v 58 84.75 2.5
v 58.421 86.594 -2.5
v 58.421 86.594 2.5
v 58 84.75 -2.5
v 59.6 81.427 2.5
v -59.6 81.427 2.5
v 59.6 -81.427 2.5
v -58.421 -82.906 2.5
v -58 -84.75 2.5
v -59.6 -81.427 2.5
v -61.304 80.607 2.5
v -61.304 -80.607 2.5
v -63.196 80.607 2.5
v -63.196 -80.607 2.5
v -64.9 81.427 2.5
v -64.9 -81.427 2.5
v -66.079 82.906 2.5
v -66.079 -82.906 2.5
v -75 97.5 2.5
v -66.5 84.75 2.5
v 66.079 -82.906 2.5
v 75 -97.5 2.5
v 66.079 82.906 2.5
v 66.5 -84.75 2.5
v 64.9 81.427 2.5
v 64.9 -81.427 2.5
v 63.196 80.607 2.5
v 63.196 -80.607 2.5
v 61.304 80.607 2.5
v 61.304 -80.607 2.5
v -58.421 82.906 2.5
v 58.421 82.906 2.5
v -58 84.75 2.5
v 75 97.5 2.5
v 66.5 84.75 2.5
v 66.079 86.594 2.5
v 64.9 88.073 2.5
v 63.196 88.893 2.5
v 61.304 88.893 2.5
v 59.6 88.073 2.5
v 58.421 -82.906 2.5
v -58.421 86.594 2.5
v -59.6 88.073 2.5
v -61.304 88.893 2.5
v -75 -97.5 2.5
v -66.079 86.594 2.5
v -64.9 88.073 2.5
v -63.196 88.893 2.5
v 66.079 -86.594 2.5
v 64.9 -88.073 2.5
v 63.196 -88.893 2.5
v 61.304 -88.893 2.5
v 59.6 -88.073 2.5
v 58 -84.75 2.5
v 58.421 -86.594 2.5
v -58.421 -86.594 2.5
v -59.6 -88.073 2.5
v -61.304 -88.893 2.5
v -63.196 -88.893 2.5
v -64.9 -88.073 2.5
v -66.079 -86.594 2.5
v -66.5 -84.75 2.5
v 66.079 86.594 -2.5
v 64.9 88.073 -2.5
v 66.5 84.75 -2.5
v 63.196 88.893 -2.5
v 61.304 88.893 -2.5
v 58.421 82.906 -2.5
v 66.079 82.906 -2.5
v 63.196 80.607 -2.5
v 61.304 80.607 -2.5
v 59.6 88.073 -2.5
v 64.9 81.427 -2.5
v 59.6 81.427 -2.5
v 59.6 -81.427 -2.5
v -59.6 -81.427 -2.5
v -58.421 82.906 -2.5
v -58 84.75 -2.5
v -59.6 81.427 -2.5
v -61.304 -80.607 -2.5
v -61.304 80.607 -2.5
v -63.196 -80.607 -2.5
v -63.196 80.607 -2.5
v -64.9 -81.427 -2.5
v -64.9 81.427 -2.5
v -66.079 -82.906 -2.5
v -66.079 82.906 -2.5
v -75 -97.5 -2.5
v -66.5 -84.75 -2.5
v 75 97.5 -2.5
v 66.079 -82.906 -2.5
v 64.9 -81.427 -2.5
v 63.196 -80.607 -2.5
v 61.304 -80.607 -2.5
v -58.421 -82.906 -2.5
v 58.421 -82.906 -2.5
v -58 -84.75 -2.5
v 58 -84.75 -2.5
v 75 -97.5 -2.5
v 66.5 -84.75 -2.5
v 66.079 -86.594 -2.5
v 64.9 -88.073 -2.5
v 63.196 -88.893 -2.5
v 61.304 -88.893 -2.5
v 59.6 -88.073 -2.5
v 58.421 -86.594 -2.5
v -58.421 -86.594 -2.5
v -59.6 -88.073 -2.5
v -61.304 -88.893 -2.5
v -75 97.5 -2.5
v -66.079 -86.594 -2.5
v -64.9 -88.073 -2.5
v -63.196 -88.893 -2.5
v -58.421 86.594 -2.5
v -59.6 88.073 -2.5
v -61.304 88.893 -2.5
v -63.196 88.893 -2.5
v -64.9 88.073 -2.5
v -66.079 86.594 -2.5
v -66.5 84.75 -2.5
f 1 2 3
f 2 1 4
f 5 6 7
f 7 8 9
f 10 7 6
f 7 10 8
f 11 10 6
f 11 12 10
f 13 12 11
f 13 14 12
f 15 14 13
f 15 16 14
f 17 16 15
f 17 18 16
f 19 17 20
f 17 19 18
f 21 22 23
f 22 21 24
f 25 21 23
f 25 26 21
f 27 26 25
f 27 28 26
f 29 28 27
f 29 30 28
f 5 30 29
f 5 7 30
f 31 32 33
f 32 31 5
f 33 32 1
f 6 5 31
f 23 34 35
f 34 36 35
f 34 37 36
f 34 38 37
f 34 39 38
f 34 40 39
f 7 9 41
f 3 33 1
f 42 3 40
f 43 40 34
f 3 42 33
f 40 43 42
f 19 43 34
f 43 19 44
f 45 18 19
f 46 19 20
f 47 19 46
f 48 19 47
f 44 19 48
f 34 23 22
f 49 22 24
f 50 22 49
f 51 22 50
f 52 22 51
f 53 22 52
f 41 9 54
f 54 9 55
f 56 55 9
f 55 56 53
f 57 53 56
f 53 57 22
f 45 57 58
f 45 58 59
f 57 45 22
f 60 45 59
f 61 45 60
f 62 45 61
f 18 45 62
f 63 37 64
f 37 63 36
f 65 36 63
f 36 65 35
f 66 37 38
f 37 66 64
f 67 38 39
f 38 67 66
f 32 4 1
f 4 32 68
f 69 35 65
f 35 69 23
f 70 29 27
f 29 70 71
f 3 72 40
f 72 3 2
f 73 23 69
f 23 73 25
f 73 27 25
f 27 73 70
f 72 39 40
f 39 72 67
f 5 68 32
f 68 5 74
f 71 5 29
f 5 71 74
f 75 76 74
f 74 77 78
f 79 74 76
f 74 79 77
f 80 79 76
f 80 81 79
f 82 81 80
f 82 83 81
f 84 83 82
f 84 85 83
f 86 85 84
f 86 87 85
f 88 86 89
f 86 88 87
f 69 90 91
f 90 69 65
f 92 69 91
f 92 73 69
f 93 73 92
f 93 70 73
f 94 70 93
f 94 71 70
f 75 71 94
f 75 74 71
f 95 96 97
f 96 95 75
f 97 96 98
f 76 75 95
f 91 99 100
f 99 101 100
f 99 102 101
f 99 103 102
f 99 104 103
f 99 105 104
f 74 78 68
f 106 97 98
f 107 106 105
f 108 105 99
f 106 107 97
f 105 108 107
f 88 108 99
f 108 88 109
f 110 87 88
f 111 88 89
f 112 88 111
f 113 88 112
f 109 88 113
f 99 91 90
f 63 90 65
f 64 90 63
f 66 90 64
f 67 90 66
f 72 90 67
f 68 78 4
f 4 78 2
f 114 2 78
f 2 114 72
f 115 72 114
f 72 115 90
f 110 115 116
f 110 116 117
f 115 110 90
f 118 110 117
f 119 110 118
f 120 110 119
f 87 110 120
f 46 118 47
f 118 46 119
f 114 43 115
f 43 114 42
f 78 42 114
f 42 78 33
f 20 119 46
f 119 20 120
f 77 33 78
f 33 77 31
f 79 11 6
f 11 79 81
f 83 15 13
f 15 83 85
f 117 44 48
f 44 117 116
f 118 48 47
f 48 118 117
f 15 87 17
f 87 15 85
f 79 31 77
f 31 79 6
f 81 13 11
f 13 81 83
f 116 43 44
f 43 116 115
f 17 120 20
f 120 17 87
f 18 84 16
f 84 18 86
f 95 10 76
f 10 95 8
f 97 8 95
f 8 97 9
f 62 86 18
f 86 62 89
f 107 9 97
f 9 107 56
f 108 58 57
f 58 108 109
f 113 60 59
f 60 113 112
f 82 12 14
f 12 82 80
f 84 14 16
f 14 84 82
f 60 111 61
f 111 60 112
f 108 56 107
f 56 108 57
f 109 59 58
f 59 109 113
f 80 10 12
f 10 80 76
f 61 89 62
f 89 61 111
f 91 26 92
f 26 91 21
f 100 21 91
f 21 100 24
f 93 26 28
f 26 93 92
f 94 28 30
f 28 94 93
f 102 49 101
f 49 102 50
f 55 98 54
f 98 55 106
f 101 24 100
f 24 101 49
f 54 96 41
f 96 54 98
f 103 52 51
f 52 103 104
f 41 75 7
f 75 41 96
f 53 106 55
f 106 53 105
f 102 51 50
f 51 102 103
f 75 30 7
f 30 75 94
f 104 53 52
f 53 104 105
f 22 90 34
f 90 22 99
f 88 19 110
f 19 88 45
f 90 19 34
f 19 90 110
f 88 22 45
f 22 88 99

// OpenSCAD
// Generated by SolidPython 1.1.3 on 2023-12-09 18:50:50


difference() {
	cube(center = true, size = [150, 195.0000000000, 5]);
	union() {
		translate(v = [62.2500000000, 84.7500000000]) {
			cylinder(center = true, h = 5, r = 4.2500000000);
		}
		translate(v = [-62.2500000000, 84.7500000000]) {
			cylinder(center = true, h = 5, r = 4.2500000000);
		}
		translate(v = [-62.2500000000, -84.7500000000]) {
			cylinder(center = true, h = 5, r = 4.2500000000);
		}
		translate(v = [62.2500000000, -84.7500000000]) {
			cylinder(center = true, h = 5, r = 4.2500000000);
		}
	}
}
/***********************************************
*********      SolidPython code:      **********
************************************************
 
import solid
import numbers
import pudb
from solid.utils import *
import viewscad
import subprocess
import os
import os.path as osp
import math
import sys

chamfer_extrude=solid.import_scad("./chamfer_extrude.scad")
chamfer_extrude=chamfer_extrude.chamfer_extrude
r = viewscad.Renderer(width=800, height=800)

def debug(model,f_name,path="/home/ts/code/projects/mfd/designs/debug"):
    solid.scad_render_to_file(model,osp.join(path,f_name)+".scad")
#generate position list of wells using offset from center
wells_pos_from_center_4 = lambda offset: [[-offset,offset],
                                        [offset, offset],
                                        [-offset, -offset],
                                        [offset, -offset]]
#wells_pos_from_center_2 = lambda offset: [[0,offset],
#                                        [0, -offset]]
wells_pos_from_center_2 = lambda offset: [[offset,0],
                                        [-offset,0]]

def make_well(dims,shape=None,height=None,dxf=False):
    def circle_cylinder():
        if dxf or (height is None):
            well = solid.circle(r=dims, segments=64)
        else:
            well = solid.cylinder(r=dims, h=height, segments=64, center = True)
        return well
    if dims is None:
        sys.exit("radius needs to be a number")
    if isinstance(dims, numbers.Number):
        well =circle_cylinder()
    elif len(dims)==1:
        if isinstance(dims[1], numbers.Number):
            well =circle_cylinder()
        else:
            sys.exit("radius needs to be a number")
    elif len(dims)==2:
        well = solid.square(dims,center = True)
    elif len(dims)==3:
        well = solid.cube(dims, center = True)
    return well

def wells_top_bottom(center_gap,device_dims=None,shape=None,height=None, positions = None, dxf = False,well_shape=None):
    if well_shape == None:
        well_shape = make_well(device_dims,shape=shape,height=height,dxf=dxf)
    wells = []
    if positions is None:
        offset = radius+radius/2.0
        positions = wells_pos_from_center_2(offset)
    if dxf or (height is None):
        height = 0
    for position in positions:
        if dxf:
            wells.append(solid.translate([position[0],position[1]])(well_shape))
        else:
            wells.append(solid.translate([position[0],position[1],height/2.0])(well_shape))
    return  union()(*wells)

#place wells in four corners 
def four_corner(radius,height=None, positions = None, dxf = False):
    #if well pos not specified set
    #to equally spaced by half radius
    if positions is None:
        offset = radius+radius/2.0
        positions = wells_pos_from_center_4(offset)
    if dxf or (height is None):
        height = 0
    #make wells at positions with specified radius and height
    wells = []
    for position in positions:
        #make circle if making dxf
        if dxf:
            well_shape = solid.circle(r=radius, segments=64)
            well_shape = solid.translate([position[0],position[1]])(well_shape)
        #if stl make cylinder
        else:
            well_shape = solid.cylinder(r=radius, h=height, segments=64, center = True)
            well_shape = solid.translate([position[0],position[1],height/2.0])(well_shape)
        wells.append(well_shape)
    return  union()(*wells)

#generate channels 
def make_channels(length,width,height=0,num_chans=1,max_chans=None,spacing=None, dxf = False,
                  rotate_channels=False):
    if dxf or (height is None):
        height = 0
    #if channel gap not defined, is equal to
    if spacing is None: spacing = width
    #calculate number of channels if fitting max num within given width
    if not max_chans is None:
        import math
        num_chans = math.floor((max_chans-spacing)/(width+spacing))
    #get total width of channel section  
    total_width = (width*num_chans)+(spacing*(num_chans-1))

    #make template channel
    #if rotate_channels: width, length = length, width
    if dxf:
        channel_t = solid.square([length,width],center = True)
    else:
        channel_t = solid.cube([length,width,height], center = True)

    #if number channels is even, offset the first channel to center its gap
    if num_chans % 2 == 0: centering = -(width/2.0+spacing/2.0)
    else: centering = 0
    #move template channel up to align bottom at z = 0 
    #and offset center if necessary
    if dxf:
        channel_t = solid.translate([0,centering])(channel_t)
    else:
        channel_t = solid.translate([0,centering,height/2.0])(channel_t)

    #if rotate_channels: length,width = width,length
    #start making the channels
    channels = []
    for i in range(num_chans):
        #if i=0 there is no translation
        #if i=1, we make the first channel adjacent to second
        direction = i

        #if i>=1, we add channels alternating left and right
        if i >= 1:
            direction = -(i/2.0)
            if i % 2 == 1: direction = (-direction)+0.5
                
        #make channel at right position and add it to channel list
        translation_coords = [0,direction*(width+spacing)]
        #if rotate_channels: translation_coords = [direction*(width+spacing),0]
        if dxf:
            channel = solid.translate(translation_coords)(channel_t)
        else:
            channel = solid.translate([*translation_coords,0])(channel_t)
        channels.append(channel)
    
    #group all channels as one object
    channels = union()(*channels)
    #compute the x,y,z dimensions in order to pass as arguments 
    #for construction of other parts of device (such as the chambers)
    measurements = {'x':(length/2.0,-length/2.0),
                    'y':(total_width/2.0,-total_width/2.0)}
    if not dxf:
        measurements['z'] = (height,0)
    if rotate_channels:
        channels = solid.rotate(90)(channels)
        measurements['x'],measurements['y']=measurements['y'],measurements['x']
    return channels,measurements

def make_chambers(msrs,height=None,extra=0,len_until=None,width=None, dxf = False):
    #computes x,y,z length
    total = lambda x : abs(x[0]) + abs(x[1])
    
    #if specific height if specified
    #otherwise use same height as channels
    if dxf:
        pass
    elif not height is None:
        msrs['z'] = (height,0)
    else:
        msrs['z'] = (0,0)
        
    #make copy of measurements from channels to modify chamber dimensions 
    #and add length to chambers as specified
    chamber_dims = msrs.copy()
    #calculate length of chamber to reach specified offset
    if not len_until is None:
        chamber_len = len_until-(msrs['x'][0])
    #or add specified length to channel length (if not specified, adds 0)
    else:
        chamber_len = msrs['x'][0]+extra
    #set the chamber length based 
    chamber_dims['x'] = (chamber_len/2.0,-(chamber_len/2.0))
    #compute final dimensions of chamber
    if not width is None:
        chamber_dims['y'] = (width/2.0,-width/2.0)
    chamber_dims = [total(size) for size in chamber_dims.values()]
        
    #calculate chamber translation offset to place adjacent to channels
    chamber_trslt = msrs['x'][0]+(chamber_len/2.0)
    #compute chamber translation coordinates to align with channels
    #x = 1 moves chamber above channels
    #x = -1 moves chamber below channels
    if dxf:
        trslt = lambda x : [x*(chamber_trslt),0]
    else:
        trslt = lambda x : [x*(chamber_trslt),0,msrs['z'][0]/2.0]
    
    #function to make chamber at top or at bottom 
    if dxf:
        move = lambda x : solid.translate(trslt(x))(solid.square(chamber_dims, center = True) )
    else:
        move = lambda x : solid.translate(trslt(x))(solid.cube(chamber_dims,center = True))
    #make top and bottom chambers and return them as grouped
    top = move(1)
    bottom = move(-1)
    #chambers=solid.rotate(90)(solid.union()(top,bottom))
    chambers=(solid.union()(top,bottom))

    return chambers

#create alignment features 
def alignment_features(unit,dims,grid_size, mask_size = None, alignment = "hollow", units_from_center = (2.5,2.5), corner_len=None):
    width = grid_size[0]*dims[0]
    length = grid_size[1]*dims[1]
    if mask_size is None and corner_len is None:
        corner_len = (dims[0] + dims[1]) /2 / 8
    corner = lambda thickness_div : solid.union()( solid.square([corner_len,corner_len/thickness_div],center=False), solid.square([corner_len/thickness_div,corner_len],center=False) )
    
    def make_full(thickness_div):
        thickness = corner_len/thickness_div
        tr = solid.translate([0, 0, 0 ])(solid.rotate(180)(corner(thickness_div)))
        tr = solid.translate([thickness/2,thickness/2,0])(tr)
        bl = solid.translate([0, 0, 0 ])(solid.rotate(0)(corner(thickness_div)))
        bl = solid.translate([-thickness/2,-thickness/2,0])(bl)
        return solid.union()(tr,bl)
    
    def make_hollow(thickness_div):
        thickness = corner_len/(thickness_div/2)
        inner = make_full(thickness_div)
        outer = make_full(thickness_div/2)
        hollow = outer - inner 
        return hollow
    
    center = (width /2 , length/2)
    mask_pos = lambda x,y : (center[0] + x*(float(units_from_center[0])*dims[0]), center[1] + y*(float(units_from_center[1])*dims[1]))
    positions = []
    positions.append(mask_pos(1,0))
    positions.append(mask_pos(0,1))
    positions.append(mask_pos(-1,0))
    positions.append(mask_pos(0,-1))
    make_mask = lambda mtype : make_hollow(8) if mtype == "hollow" else make_full(8)
    masks = [ solid.translate([*position,0])(make_mask(alignment)) for position in positions]
    
    solid.scad_render_to_file(solid.union()(*masks),"./designs/open_chamber/masks.scad")
    #return unit - solid.union()(*masks)
    return solid.union()(*masks,unit)

def create_outline(thickness, array, dims, grid_size,):
    width = grid_size[0]*dims[0] + thickness *2
    length = grid_size[1]*dims[1] + thickness *2
    outer = solid.translate([-thickness, -thickness,0])(solid.square([width, length]))
    return outer-array

def create_wall(wall_thickness, outline_thickness, dims, grid_size, wall_height = 2000, dxf = False):
    inner_width = grid_size[0]*dims[0] + outline_thickness *2
    inner_length = grid_size[1]*dims[1] + outline_thickness *2
    outer_width = inner_width + wall_thickness * 2
    outer_length = inner_length + wall_thickness * 2
    outer_pos_x = -outline_thickness-wall_thickness
    outer_pos_y = -outline_thickness-wall_thickness
    inner_pos_x = -outline_thickness
    inner_pos_y = -outline_thickness
    if dxf:
        inner_wall = solid.translate([inner_pos_x,
                                      inner_pos_y,
                                      0])(solid.square([inner_width, inner_length]))
        outer_wall = solid.translate([outer_pos_x,
                                      outer_pos_y,
                                      0])(solid.square([outer_width, outer_length]))

        return outer_wall-inner_wall
    else:
        inner_wall = solid.translate([inner_pos_x,
                                      inner_pos_y,
                                      0])(solid.cube([inner_width, inner_length,wall_height]))
        outer_wall = solid.translate([outer_pos_x,
                                      outer_pos_y,
                                      0])(solid.cube([outer_width, outer_length,wall_height]))

        return outer_wall-inner_wall, {'wall_height': wall_height,
                                       'wall_thickness': wall_thickness,
                                       'inner_width':inner_width,
                                       'inner_length': inner_length,
                                       'outer_width': outer_width,
                                       'outer_length': outer_length,
                                       'outer_pos_x' : outer_pos_x,
                                       'outer_pos_y' : outer_pos_y,
                                       'inner_pos_x' : inner_pos_x,
                                       'inner_pos_y' : inner_pos_y}

def create_thicker_wall(wall_thickness, outer_wall_offset, wall_dims, dims, grid_size, height_start = .2, height_end=2, dxf = False):
    addon_wall,thicker_wall_dims = create_wall(wall_thickness, outer_wall_offset, dims, grid_size, wall_height=height_end-height_start, dxf = False)
    addon_wall = solid.translate([0,0,height_start])(addon_wall)

    thicker_wall_dims['wall_height'] = height_end
    thicker_wall_dims['wall_thickness'] = wall_dims['wall_thickness'] + wall_thickness
    return addon_wall, thicker_wall_dims
 
def add_lock_to_wall(wall,wall_dims,y_offset = 0,cut_ratio=0.7,L_length=3, gap_ratio=0.05, axis="x",width_ratio=1/2):
    # Makes L shape
    def make_L(max_length,length_thickness,max_width,width_thickness,height,y_offset):
        length = solid.cube([max_length,length_thickness,height])
        width = solid.cube([width_thickness,max_width,height])
        width = solid.translate([max_length-(width_thickness),0,0])(width)
        L = solid.union()(width,length)
        debug(L,"L")
        if axis == "x":
            L = solid.rotate(-90)(L)
            L = solid.translate([0,max_length,0])(L)
        else:
            L = solid.rotate(-180)(L)
            L = solid.translate([max_length,max_width,0])(L)
        return solid.translate([0,0,y_offset])(L)
    
    lock_length = L_length
    lock_width = wall_dims['wall_thickness']*width_ratio
    lock_length_thickness = lock_width/2
    lock_width_thickness = lock_width/2
    L_lock = make_L(lock_length,lock_length_thickness,lock_width,lock_width_thickness, wall_dims['wall_height']-y_offset, y_offset)
    
    margin_space = lock_length - lock_length*(1-gap_ratio)
    key_length = lock_length-margin_space
    key_length_thickness = lock_length_thickness-(margin_space*2)
    key_width = lock_width-(margin_space*2)
    key_width_thickness = lock_width_thickness-(margin_space*2)
    L_key = make_L(key_length,key_length_thickness,key_width,key_width_thickness, wall_dims['wall_height']-y_offset, y_offset)
    L_key = solid.translate([margin_space,margin_space,0])(L_key)
    L = solid.union()(L_lock,L_key)
    debug(L,"L")
    
    #Make cube to be used as negative to split frame in a half
    #Can choose if making left or right negative, specify ratio of split
    def make_negative(right,cut_ratio):
        if axis == "x":
            if right:
                length = wall_dims['outer_length']*(1-cut_ratio)
                pos_x = wall_dims['outer_pos_x']+(wall_dims['outer_length']*cut_ratio)
            else:
                length = wall_dims['outer_length']*(cut_ratio)
                pos_x = wall_dims['outer_pos_x'] 
            negative = solid.cube([wall_dims['outer_width'],length, wall_dims['wall_height']])
            negative = solid.translate([wall_dims['outer_pos_y'],pos_x,0])(negative)
        else:
            if right:
                length = wall_dims['outer_width']*(1-cut_ratio)
                pos_x = wall_dims['outer_pos_y']+(wall_dims['outer_width']*cut_ratio)
            else:
                length = wall_dims['outer_width']*(cut_ratio)
                pos_x = wall_dims['outer_pos_y'] 
            negative = solid.cube([length,wall_dims['outer_length'], wall_dims['wall_height']])
            negative = solid.translate([pos_x,wall_dims['outer_pos_x'],0])(negative)
        return negative, pos_x, length 
                      
    #Make negatives
    negative_right, right_half_pos_x, right_half_length = make_negative(True,cut_ratio)
    negative_left, left_half_pos_x, right_half_length = make_negative(False,cut_ratio)
    #Make halves
    left_half = solid.difference()(wall,negative_right)
    right_half = solid.difference()(wall,negative_left)
    def place_L(L, L_length,L_width):
        #Place L on top wall       
        offset_to_center = (wall_dims['wall_thickness']-L_width)/2
        if axis == "x":
            y_pos_top = (wall_dims['outer_pos_y'] +
                    wall_dims['outer_width'] - 
                    L_width - offset_to_center)
            top_L = solid.translate([y_pos_top,
                                     right_half_pos_x-(L_length),
                                     0])(L)
            #Place L on bottom wall       
            y_pos_bottom = wall_dims['outer_pos_y']+offset_to_center
            bottom_L = solid.translate([y_pos_bottom,
                                        right_half_pos_x-L_length,
                                        0])(L)
        else:
            y_pos_top = (wall_dims['outer_pos_x'] +
                    wall_dims['outer_length'] -
                    (L_width+offset_to_center))
            top_L = solid.translate([right_half_pos_x-L_length,
                                     y_pos_top,
                                     0])(L)
            #Place L on bottom wall       
            y_pos_bottom = wall_dims['outer_pos_y']+offset_to_center
            bottom_L = solid.translate([right_half_pos_x-L_length,
                                        y_pos_bottom,
                                        0])(L)
        return bottom_L, top_L
    #Make complimentary L pieces through union and differences
    #Make Lock
    bottom_L_lock, top_L_lock = place_L(L_lock,L_length,lock_width)
    left_half = solid.difference()(left_half,bottom_L_lock)
    left_half = solid.difference()(left_half,top_L_lock)
    #Make Key
    bottom_L_key, top_L_key = place_L(L_key,L_length,lock_width)
    right_half = solid.union()(right_half,bottom_L_key)
    right_half = solid.union()(right_half,top_L_key)
    return left_half, right_half


#build a row x col grid of containment units
def make_unit_array(unit,dims,grid_size, dxf = False, alignment = None, mask_size = None,
                    units_from_center = None,alignment_offset=None, alignment_mark_size=1):
    units = []
    for col in range(grid_size[1]):
        for row in range(grid_size[0]):
            if dxf:
                units.append(solid.translate([row*dims[0],col*dims[1]])(unit))
            else:
                units.append(solid.translate([row*dims[0],col*dims[1],dims[2]/2.0])(unit))
    array = solid.union()(*units)
    if (not alignment is None) and dxf:
        if not alignment_offset is None:
            array = solid.translate([alignment_offset[0],alignment_offset[1]])(array)
        array = alignment_features(array,dims, grid_size, alignment = alignment, mask_size = None, units_from_center = units_from_center,corner_len=alignment_mark_size)
        if not alignment_offset is None:
            array = solid.translate([-alignment_offset[0],-alignment_offset[1]])(array)
    return array


def make_taylor(wells_pos = wells_pos_from_center_4(2.25), well_rad = 1.5 ,
                well_height = 2, chan_w = 0.01, chan_l = 1, chan_h = 0.010 ,
                chan_gap = 0.040, max_chans = None,num_chans=100, chamber_height  = 0.100,
                columns = 1, rows = 1, chamber_len_until=2.25, add_channels = True, add_wells = True, 
                add_chambers = True, save_path = "./", alignment = None, units_from_center = 2,
                mask_size = None, render_stl = False, outline_thickness = 0.050, dxf = True,
                wall_height = 15, wall_thickness = 0.95, casing_x=9, casing_y=9, casing_z=0,rotate_units=0):

    dims = [casing_x, casing_y, casing_z]
    wells = four_corner(well_rad,well_height, dxf = dxf, positions = wells_pos)
    debug(wells,"wells")
    channels, msrs = make_channels(chan_l,chan_w,chan_h,dxf=dxf, spacing = chan_gap, max_chans=max_chans,num_chans=num_chans)
    debug(channels,"channels")
    chambers = make_chambers(msrs,dxf = dxf, height=chamber_height,len_until=chamber_len_until)
    debug(chambers,"chambers")

    #add together and render
    device_parts = []
    if add_channels:
        device_parts.append(channels)
    if add_wells:
        device_parts.append(wells)
    if add_chambers:
        device_parts.append(chambers)
    device=union()(*device_parts)
    device = rotate(rotate_units)(device)

    device=solid.translate([dims[0]/2.0,dims[1]/2.0,0])(device)
    channels = rotate(rotate_units)(channels)
    channels=solid.translate([dims[0]/2,dims[1]/2,0])(channels)
    chambers_wells = union()(wells,chambers)
    chambers_wells = rotate(rotate_units)(chambers_wells)
    chambers_wells=solid.translate([dims[0]/2,dims[1]/2,0])(chambers_wells)

    file_name = str(rows)+'x'+str(columns)+'_units_'
    grid_size = [rows,columns]

    if alignment:
        alignment="full"
    device = make_unit_array(device,dims,grid_size, dxf=dxf, alignment = alignment,
                                 units_from_center = units_from_center)
    channels = make_unit_array(channels,dims,grid_size, dxf=dxf, alignment = alignment,
                                 units_from_center = units_from_center)
    if alignment=="full":
        alignment="hollow"

    chambers_wells = make_unit_array(chambers_wells,dims,grid_size, dxf=dxf, alignment = alignment,
                                 units_from_center =units_from_center)

    def save_model(model,prefix):
        model_fname = os.path.abspath(save_path+prefix+"_"+file_name+".scad")
        solid.scad_render_to_file(model,model_fname)
        return model_fname

    wells_fname = save_model(wells,"wells")
    channels_fname = save_model(channels,"channels")
    device_fname = save_model(device,"device")
    chambers_wells_fname = save_model(chambers_wells,"chambers_wells")
    return (chambers_wells,chambers_wells_fname), (channels,channels_fname), (device,device_fname)

def make_device(design='open',rows=8,columns=6,wells_pos = 4.5,well_offset=3.2, well_rad=3.2,well_height=0.1,
                chan_l=1,chan_w=0.01,chan_h=0.01,chan_gap=0.015,num_chans=101,dxf=True,save_path="./designs/open_chamber/",
                casing_x=9.0,casing_y=18.0,casing_z=0,rotate_units=90,units_from_center=(3,1),chamber_len_until=4.5,
                chamber_width=None,alignment=True, add_wells=True, add_channels=True,add_chambers=True,well_shape=None):

    dims = [casing_x, casing_y, casing_z]
    if design == "open":
        wells_pos=wells_pos_from_center_2(wells_pos)
        wells = wells_top_bottom(well_offset*2,device_dims=well_rad,height=well_height, dxf = dxf, positions = wells_pos,well_shape=well_shape)
    elif design == "closed":
        wells_pos=wells_pos_from_center_4(wells_pos)
        debug(wells,"wells")
        wells = four_corner(well_offset,well_height,device_dims=well_rad, dxf = dxf, positions = wells_pos)
    else:
        print(design+" is not a valid design.\n Choose valid design: 'open' or 'closed'")
        exit()
    wells = rotate(rotate_units)(wells)
    wells=solid.translate([dims[0]/2,dims[1]/2,0])(wells)
    debug(wells,"wells")

    channels, msrs = make_channels(chan_l,chan_w,chan_h,dxf=dxf, spacing = chan_gap, num_chans=num_chans,rotate_channels=False)
    channels = rotate(rotate_units)(channels)
    channels=solid.translate([dims[0]/2,dims[1]/2,0])(channels)

    chambers=make_chambers(msrs,height=None,extra=0,len_until=chamber_len_until, width=chamber_width,dxf = dxf)
    chambers = rotate(rotate_units)(chambers)
    chambers=solid.translate([dims[0]/2,dims[1]/2,0])(chambers)

    device_parts = []
    if add_channels:
        device_parts.append(channels)
    if add_wells:
        device_parts.append(wells)
    if add_chambers:
        device_parts.append(chambers)
    device = union()(*device_parts)
    #device = rotate(rotate_units)(device)
    #device=solid.translate([dims[0]/2.0,dims[1]/2.0,0])(device)

    chambers_wells = []
    if add_chambers:
        chambers_wells.append(chambers)
    if add_wells:
        chambers_wells.append(wells)
    chambers_wells = union()(*chambers_wells)
    #chambers_wells = union()(wells,chambers)
    #chambers_wells = rotate(rotate_units)(chambers_wells)
    #chambers_wells=solid.translate([dims[0]/2,dims[1]/2,0])(chambers_wells)

    file_name = str(rows)+'x'+str(columns)+'_units_'

    grid_size = [rows,columns]
    if alignment:
        alignment="full"
    device = make_unit_array(device,dims,grid_size, dxf=dxf, alignment = alignment,
                                 units_from_center = units_from_center)
    channels = make_unit_array(channels,dims,grid_size, dxf=dxf, alignment = alignment,
                                 units_from_center = units_from_center)
    if alignment=="full":
        alignment="hollow"

    chambers_wells = make_unit_array(chambers_wells,dims,grid_size, dxf=dxf, alignment = alignment,
                                 units_from_center =units_from_center)

    def save_model(model,prefix):
        model_fname = os.path.abspath(save_path+prefix+"_"+file_name+".scad")
        solid.scad_render_to_file(model,model_fname)
        return model_fname

    wells_fname = save_model(wells,"wells")
    channels_fname = save_model(channels,"channels")
    device_fname = save_model(device,"device")
    chambers_wells_fname = save_model(chambers_wells,"chambers_wells")
    return (chambers_wells,chambers_wells_fname), (channels,channels_fname), (device,device_fname)


def make_open_chamber(rows=8,columns=6,wells_pos = wells_pos_from_center_2(4.5), well_rad=3.2,well_height=0.1,
                      chan_l=1,chan_w=0.01,chan_h=0.01,chan_gap=0.015,num_chans=101,dxf=True,save_path="./designs/open_chamber/",
                      casing_x=9.0,casing_y=18.0,casing_z=0,rotate_units=90,units_from_center=(3,1),chamber_len_until=4.5,
                      chamber_width=None,alignment=True, add_wells=True, add_channels=True,add_chambers=True,well_shape=None):

    dims = [casing_x, casing_y, casing_z]
    wells = wells_top_bottom(well_rad,height=well_height, dxf = dxf, positions = wells_pos, well_shape=well_shape)
    channels, msrs = make_channels(chan_l,chan_w,chan_h,dxf=dxf, spacing = chan_gap, num_chans=num_chans,rotate_channels=False)
    chambers=make_chambers(msrs,height=None,extra=0,len_until=chamber_len_until, width=chamber_width,dxf = dxf)
    debug(chambers,"chambers")
    device_parts = []
    if add_channels:
        device_parts.append(channels)
    if add_wells:
        device_parts.append(wells)
    if add_chambers:
        device_parts.append(chambers)
    device = union()(*device_parts)
    device = rotate(rotate_units)(device)
    device=solid.translate([dims[0]/2.0,dims[1]/2.0,0])(device)
    channels = rotate(rotate_units)(channels)
    channels=solid.translate([dims[0]/2,dims[1]/2,0])(channels)
    chambers_wells = union()(wells,chambers)
    chambers_wells = rotate(rotate_units)(chambers_wells)
    chambers_wells=solid.translate([dims[0]/2,dims[1]/2,0])(chambers_wells)

    file_name = str(rows)+'x'+str(columns)+'_units_'

    grid_size = [rows,columns]
    if alignment:
        alignment="full"
    device = make_unit_array(device,dims,grid_size, dxf=dxf, alignment = alignment,
                                 units_from_center = units_from_center)
    channels = make_unit_array(channels,dims,grid_size, dxf=dxf, alignment = alignment,
                                 units_from_center = units_from_center)
    if alignment=="full":
        alignment="hollow"

    chambers_wells = make_unit_array(chambers_wells,dims,grid_size, dxf=dxf, alignment = alignment,
                                 units_from_center =units_from_center)

    def save_model(model,prefix):
        model_fname = os.path.abspath(save_path+prefix+"_"+file_name+".scad")
        solid.scad_render_to_file(model,model_fname)
        return model_fname

    wells_fname = save_model(wells,"wells")
    channels_fname = save_model(channels,"channels")
    device_fname = save_model(device,"device")
    chambers_wells_fname = save_model(chambers_wells,"chambers_wells")
    return (chambers_wells,chambers_wells_fname), (channels,channels_fname), (device,device_fname)

def to_dxf(scad_path):
    dxf_path = scad_path.replace(".scad",".dxf")
    subprocess.call(["openscad", "-o", dxf_path, scad_path])
    import ezdxf
    temp_dxf = ezdxf.readfile(dxf_path)
    temp_dxf.saveas(dxf_path)

#def make_walls(diameter,thickness,grid_size,dims,height=20,segments=256,make_inner=True):
#    wafer_wall_out = solid.cylinder(r=diameter/2,h=height, segments=segments)
#    wafer_wall_in = solid.cylinder(r=(diameter/2-thickness),h=height, segments=segments)
#    wafer_wall = solid.difference()(wafer_wall_out,wafer_wall_in)
#    wafer_wall = solid.translate([grid_size[1]*dims[1]/2.0,grid_size[0]*dims[0]/2.0])(wafer_wall)
#
#    vertical_wall_length = grid_size[1]*dims[1]
#    horizontal_wall_length = grid_size[0]*dims[0]
#    vertical_wall = solid.cube([vertical_wall_length,thickness,height],center = True)
#    vertical_wall = solid.translate([vertical_wall_length/2,0,height/2])(vertical_wall)
#    horizontal_wall = solid.cube([thickness,horizontal_wall_length,height],center = True)
#    horizontal_wall = solid.translate([0,vertical_wall_length/2,height/2])(horizontal_wall)
#    walls = []
#    walls.append(horizontal_wall)
#    walls.append(vertical_wall)
#    for col in range(grid_size[1]):
#        if col == grid_size[1]-1: 
#            walls.append(solid.translate([0,(col+1)*dims[1]])(vertical_wall))
#        elif col > 0 and col < grid_size[1]-1 and make_inner==True:
#            walls.append(solid.translate([0,(col+1)*dims[1]])(vertical_wall))
#    for row in range(grid_size[0]):
#        if row == grid_size[0]-1: 
#            walls.append(solid.translate([(row+1)*dims[0],0])(horizontal_wall))
#        elif row > 0 and row < grid_size[0]-1 and make_inner==True:
#            walls.append(solid.translate([(row+1)*dims[0],0])(horizontal_wall))
#    walls = union()(*walls)
#    wafer_walls = union()(walls,wafer_wall)
#    return walls,wafer_wall,wafer_walls

def make_walls(diameter,thickness,grid_size,dims,height=20,segments=256,make_inner=True,padx=0,pady=0):
    wafer_wall_out = solid.cylinder(r=diameter/2,h=height, segments=segments)
    wafer_wall_in = solid.cylinder(r=(diameter/2-thickness),h=height, segments=segments)
    wafer_wall = solid.difference()(wafer_wall_out,wafer_wall_in)
    wafer_wall = solid.translate([grid_size[1]*dims[1]/2.0,grid_size[0]*dims[0]/2.0])(wafer_wall)

    vertical_wall_length = grid_size[0]*dims[0]+padx
    horizontal_wall_length = grid_size[1]*dims[1]+pady
    vertical_wall = solid.cube([vertical_wall_length,thickness,height],center = True)
    vertical_wall = solid.translate([vertical_wall_length/2-pady/2,-padx/2,height/2])(vertical_wall)
    horizontal_wall = solid.cube([thickness,horizontal_wall_length,height],center = True)
    horizontal_wall = solid.translate([-pady/2,horizontal_wall_length/2-padx/2,height/2])(horizontal_wall)
    walls = []
    walls.append(horizontal_wall)
    walls.append(vertical_wall)
    for col in range(grid_size[1]):
        if col == grid_size[1]-1: 
            walls.append(solid.translate([0,(col+1)*dims[1]+pady])(vertical_wall))
        elif col > 0 and col < grid_size[1]-1 and make_inner==True:
            walls.append(solid.translate([0,(col+1)*dims[1]])(vertical_wall))
    for row in range(grid_size[0]):
        if row == grid_size[0]-1: 
            walls.append(solid.translate([(row+1)*dims[0]+padx,0])(horizontal_wall))
        elif row > 0 and row < grid_size[0]-1 and make_inner==True:
            walls.append(solid.translate([(row+1)*dims[0],0])(horizontal_wall))
    walls = union()(*walls)
    wafer_walls = union()(walls,wafer_wall)
    return walls,wafer_wall,wafer_walls

def save_model(model,base_path,base_name,dxf=True):
    if not os.path.exists(base_path):
        os.makedirs(base_path)
    dxf_path=osp.join(base_path,base_name+".scad")
    solid.scad_render_to_file(model,osp.join(dxf_path))
    if dxf:
        to_dxf(dxf_path)

def make_wafer(diameter,flat_len,thickness):
    wafer = solid.cylinder(r1=diameter/2,r2=diameter/2,h=thickness,segments=512,)()
    x_start_flat=(flat_len/2)
    y_start_flat = math.sqrt(((diameter/2)**2) - (x_start_flat**2) )
    height_delete_flat=diameter/2-y_start_flat
    flat_delete = solid.cube([flat_len,height_delete_flat,thickness],center=False)()
    flat_delete = solid.translate([-flat_len/2,y_start_flat,0])(flat_delete)
    wafer = solid.difference()(wafer,flat_delete)
    wafer = solid.rotate(90)(wafer)
    return wafer

def add_wafer_to_mask(wafer_size,flat_len,mask,grid_size,dims,wafer_line_thickness=0.1,outer_mask_thickness=5,alignment_offset=None):
    def make_wafer_mask(wafer_size,flat_len):
        wafer_mask = make_wafer(wafer_size,flat_len,1)
        wafer_mask = solid.projection()(wafer_mask)
        wafer_mask = solid.translate([grid_size[0]*dims[0]/2.0,grid_size[1]*dims[1]/2.0])(wafer_mask)
        if not alignment_offset is None:
            wafer_mask = solid.translate([-alignment_offset[0],-alignment_offset[1]])(wafer_mask)
        return wafer_mask

    inner_wafer_line_mask = make_wafer_mask(wafer_size-wafer_line_thickness/2,flat_len)
    outer_wafer_line_mask = make_wafer_mask(wafer_size+wafer_line_thickness/2,flat_len)
    outer_wafer_mask = make_wafer_mask(wafer_size+outer_mask_thickness,flat_len)
    outer_wafer_mask = solid.difference()(outer_wafer_mask,outer_wafer_line_mask)
    wafer_mask = solid.union()(outer_wafer_mask,inner_wafer_line_mask)

    return solid.difference()(wafer_mask,mask)

def make_posts(post_shape,post_height):
    posts = solid.linear_extrude(height=post_height)(post_shape)
    return posts

def make_wafer_empty(diameter,flat_len,thickness,margin,notch_len=20,notch_height=5,oversize=1.01):
    diameter*=oversize
    flat_len*=oversize
    wafer = make_wafer(diameter,flat_len,thickness)
    holder = solid.cylinder(r1=diameter/2+margin,r2=diameter/2+margin,h=thickness,segments=512)()
    holder = solid.difference()(holder,wafer)

    x_start_flat=(flat_len/2)
    y_start_flat = math.sqrt(((diameter/2)**2) - (x_start_flat**2) )
    height_delete_flat=diameter/2-y_start_flat
    notch = solid.cube([notch_len,notch_height,thickness],center=False)()
    notch = solid.translate([-notch_len/2,y_start_flat,0])(notch)
    notch = solid.rotate(90)(notch)
    return solid.difference()(holder,notch)

def wafer_print_calibration(diameter,thickness,height,z_offset):
    circles = []
    radii = []
    radii.append(diameter/2.0*0.8)
    radii.append(diameter/2.0*0.6)
    radii.append(diameter/2.0*0.4)
    radii.append(diameter/2.0*0.2)
    for radius in radii:
        inner = solid.cylinder(r1=radius-(thickness/2.0),r2=radius-(thickness/2.0),h=thickness,segments=512,)()
        outer = solid.cylinder(r1=radius+(thickness/2.0),r2=radius+(thickness/2.0),h=thickness,segments=512,)()
        diff = solid.difference()(outer,inner)
        circles.append(diff)
    circles = solid.union()(*circles)
    circles = solid.translate([0,0,z_offset])(circles)
    return circles

def make_rack(wells,dims,grid_size,alignment_offset,rack_x,rack_y,rack_thickness,bolt_width,add_bolts=True):

    #get X and Y dimensions of gride of pipette tips
    X_len = dims[0]*grid_size[0]
    Y_len = dims[1]*grid_size[1]
    #make rack
    rack = solid.cube([rack_x,rack_y,rack_thickness],center=True)

    if add_bolts:
    #add bolt holes
        bolt_hole=solid.cylinder(r=bolt_width/2,h=rack_thickness,center=True)()
        bolt_holes = []
        bolt_holes.append(solid.translate([rack_x/2-1.5*bolt_width,rack_y/2-1.5*bolt_width])(bolt_hole))
        bolt_holes.append(solid.translate([-rack_x/2+1.5*bolt_width,rack_y/2-1.5*bolt_width])(bolt_hole))
        bolt_holes.append(solid.translate([-rack_x/2+1.5*bolt_width,-rack_y/2+1.5*bolt_width])(bolt_hole))
        bolt_holes.append(solid.translate([rack_x/2-1.5*bolt_width,-rack_y/2+1.5*bolt_width])(bolt_hole))
        bolt_holes = solid.union()(*bolt_holes)
        rack=solid.difference()(rack,bolt_holes)
    rack_support = rack

    #center rack with pipette holes
    rack = solid.translate([0,0,rack_thickness/2])(rack)
    rack = solid.translate([X_len/2,Y_len/2])(rack)
    rack = solid.translate([-alignment_offset[0],-alignment_offset[1]])(rack)
    wells = solid.linear_extrude(height=rack_thickness)(wells)
    rack = solid.difference()(rack,wells)
    return rack, rack_support

def make_pillar(wells,dims,grid_size,alignment_offset,rack_x,rack_y,pillar_height,rack_thickness,bolt_width,add_bolts=True,taper_angle=1,bolt_position_corner=1.5):

    #get X and Y dimensions of gride of pipette tips
    X_len = dims[0]*grid_size[0]
    Y_len = dims[1]*grid_size[1]
    #make rack
    rack = solid.cube([rack_x,rack_y,rack_thickness],center=True)
    
    if add_bolts:
    #add bolt holes
        bolt_hole=solid.cylinder(r=bolt_width/2,h=rack_thickness,center=True)()
        bolt_holes = []
        bolt_holes.append(solid.translate([rack_x/2-bolt_position_corner*bolt_width,rack_y/2-bolt_position_corner*bolt_width])(bolt_hole))
        bolt_holes.append(solid.translate([-rack_x/2+bolt_position_corner*bolt_width,rack_y/2-bolt_position_corner*bolt_width])(bolt_hole))
        bolt_holes.append(solid.translate([-rack_x/2+bolt_position_corner*bolt_width,-rack_y/2+bolt_position_corner*bolt_width])(bolt_hole))
        bolt_holes.append(solid.translate([rack_x/2-bolt_position_corner*bolt_width,-rack_y/2+bolt_position_corner*bolt_width])(bolt_hole))
        bolt_holes = solid.union()(*bolt_holes)
        rack=solid.difference()(rack,bolt_holes)
    rack_support = rack

    #center rack with pipette holes
    #rack = solid.translate([0,0,-rack_thickness])(rack)
    rack = solid.translate([X_len/2,Y_len/2])(rack)
    rack = solid.translate([-alignment_offset[0],-alignment_offset[1]])(rack)
    if not taper_angle == 0:
        wells=chamfer_extrude(pillar_height,taper_angle,segments=20)(wells)
    else:
        wells = solid.linear_extrude(height=pillar_height)(wells)
    rack = solid.union()(rack,wells)
    return rack, rack_support

def deg_taper_len(height,deg):
    if not deg == 0:
        return height*math.tan(math.radians(deg))
    else:
        return 0









 
 
************************************************/
